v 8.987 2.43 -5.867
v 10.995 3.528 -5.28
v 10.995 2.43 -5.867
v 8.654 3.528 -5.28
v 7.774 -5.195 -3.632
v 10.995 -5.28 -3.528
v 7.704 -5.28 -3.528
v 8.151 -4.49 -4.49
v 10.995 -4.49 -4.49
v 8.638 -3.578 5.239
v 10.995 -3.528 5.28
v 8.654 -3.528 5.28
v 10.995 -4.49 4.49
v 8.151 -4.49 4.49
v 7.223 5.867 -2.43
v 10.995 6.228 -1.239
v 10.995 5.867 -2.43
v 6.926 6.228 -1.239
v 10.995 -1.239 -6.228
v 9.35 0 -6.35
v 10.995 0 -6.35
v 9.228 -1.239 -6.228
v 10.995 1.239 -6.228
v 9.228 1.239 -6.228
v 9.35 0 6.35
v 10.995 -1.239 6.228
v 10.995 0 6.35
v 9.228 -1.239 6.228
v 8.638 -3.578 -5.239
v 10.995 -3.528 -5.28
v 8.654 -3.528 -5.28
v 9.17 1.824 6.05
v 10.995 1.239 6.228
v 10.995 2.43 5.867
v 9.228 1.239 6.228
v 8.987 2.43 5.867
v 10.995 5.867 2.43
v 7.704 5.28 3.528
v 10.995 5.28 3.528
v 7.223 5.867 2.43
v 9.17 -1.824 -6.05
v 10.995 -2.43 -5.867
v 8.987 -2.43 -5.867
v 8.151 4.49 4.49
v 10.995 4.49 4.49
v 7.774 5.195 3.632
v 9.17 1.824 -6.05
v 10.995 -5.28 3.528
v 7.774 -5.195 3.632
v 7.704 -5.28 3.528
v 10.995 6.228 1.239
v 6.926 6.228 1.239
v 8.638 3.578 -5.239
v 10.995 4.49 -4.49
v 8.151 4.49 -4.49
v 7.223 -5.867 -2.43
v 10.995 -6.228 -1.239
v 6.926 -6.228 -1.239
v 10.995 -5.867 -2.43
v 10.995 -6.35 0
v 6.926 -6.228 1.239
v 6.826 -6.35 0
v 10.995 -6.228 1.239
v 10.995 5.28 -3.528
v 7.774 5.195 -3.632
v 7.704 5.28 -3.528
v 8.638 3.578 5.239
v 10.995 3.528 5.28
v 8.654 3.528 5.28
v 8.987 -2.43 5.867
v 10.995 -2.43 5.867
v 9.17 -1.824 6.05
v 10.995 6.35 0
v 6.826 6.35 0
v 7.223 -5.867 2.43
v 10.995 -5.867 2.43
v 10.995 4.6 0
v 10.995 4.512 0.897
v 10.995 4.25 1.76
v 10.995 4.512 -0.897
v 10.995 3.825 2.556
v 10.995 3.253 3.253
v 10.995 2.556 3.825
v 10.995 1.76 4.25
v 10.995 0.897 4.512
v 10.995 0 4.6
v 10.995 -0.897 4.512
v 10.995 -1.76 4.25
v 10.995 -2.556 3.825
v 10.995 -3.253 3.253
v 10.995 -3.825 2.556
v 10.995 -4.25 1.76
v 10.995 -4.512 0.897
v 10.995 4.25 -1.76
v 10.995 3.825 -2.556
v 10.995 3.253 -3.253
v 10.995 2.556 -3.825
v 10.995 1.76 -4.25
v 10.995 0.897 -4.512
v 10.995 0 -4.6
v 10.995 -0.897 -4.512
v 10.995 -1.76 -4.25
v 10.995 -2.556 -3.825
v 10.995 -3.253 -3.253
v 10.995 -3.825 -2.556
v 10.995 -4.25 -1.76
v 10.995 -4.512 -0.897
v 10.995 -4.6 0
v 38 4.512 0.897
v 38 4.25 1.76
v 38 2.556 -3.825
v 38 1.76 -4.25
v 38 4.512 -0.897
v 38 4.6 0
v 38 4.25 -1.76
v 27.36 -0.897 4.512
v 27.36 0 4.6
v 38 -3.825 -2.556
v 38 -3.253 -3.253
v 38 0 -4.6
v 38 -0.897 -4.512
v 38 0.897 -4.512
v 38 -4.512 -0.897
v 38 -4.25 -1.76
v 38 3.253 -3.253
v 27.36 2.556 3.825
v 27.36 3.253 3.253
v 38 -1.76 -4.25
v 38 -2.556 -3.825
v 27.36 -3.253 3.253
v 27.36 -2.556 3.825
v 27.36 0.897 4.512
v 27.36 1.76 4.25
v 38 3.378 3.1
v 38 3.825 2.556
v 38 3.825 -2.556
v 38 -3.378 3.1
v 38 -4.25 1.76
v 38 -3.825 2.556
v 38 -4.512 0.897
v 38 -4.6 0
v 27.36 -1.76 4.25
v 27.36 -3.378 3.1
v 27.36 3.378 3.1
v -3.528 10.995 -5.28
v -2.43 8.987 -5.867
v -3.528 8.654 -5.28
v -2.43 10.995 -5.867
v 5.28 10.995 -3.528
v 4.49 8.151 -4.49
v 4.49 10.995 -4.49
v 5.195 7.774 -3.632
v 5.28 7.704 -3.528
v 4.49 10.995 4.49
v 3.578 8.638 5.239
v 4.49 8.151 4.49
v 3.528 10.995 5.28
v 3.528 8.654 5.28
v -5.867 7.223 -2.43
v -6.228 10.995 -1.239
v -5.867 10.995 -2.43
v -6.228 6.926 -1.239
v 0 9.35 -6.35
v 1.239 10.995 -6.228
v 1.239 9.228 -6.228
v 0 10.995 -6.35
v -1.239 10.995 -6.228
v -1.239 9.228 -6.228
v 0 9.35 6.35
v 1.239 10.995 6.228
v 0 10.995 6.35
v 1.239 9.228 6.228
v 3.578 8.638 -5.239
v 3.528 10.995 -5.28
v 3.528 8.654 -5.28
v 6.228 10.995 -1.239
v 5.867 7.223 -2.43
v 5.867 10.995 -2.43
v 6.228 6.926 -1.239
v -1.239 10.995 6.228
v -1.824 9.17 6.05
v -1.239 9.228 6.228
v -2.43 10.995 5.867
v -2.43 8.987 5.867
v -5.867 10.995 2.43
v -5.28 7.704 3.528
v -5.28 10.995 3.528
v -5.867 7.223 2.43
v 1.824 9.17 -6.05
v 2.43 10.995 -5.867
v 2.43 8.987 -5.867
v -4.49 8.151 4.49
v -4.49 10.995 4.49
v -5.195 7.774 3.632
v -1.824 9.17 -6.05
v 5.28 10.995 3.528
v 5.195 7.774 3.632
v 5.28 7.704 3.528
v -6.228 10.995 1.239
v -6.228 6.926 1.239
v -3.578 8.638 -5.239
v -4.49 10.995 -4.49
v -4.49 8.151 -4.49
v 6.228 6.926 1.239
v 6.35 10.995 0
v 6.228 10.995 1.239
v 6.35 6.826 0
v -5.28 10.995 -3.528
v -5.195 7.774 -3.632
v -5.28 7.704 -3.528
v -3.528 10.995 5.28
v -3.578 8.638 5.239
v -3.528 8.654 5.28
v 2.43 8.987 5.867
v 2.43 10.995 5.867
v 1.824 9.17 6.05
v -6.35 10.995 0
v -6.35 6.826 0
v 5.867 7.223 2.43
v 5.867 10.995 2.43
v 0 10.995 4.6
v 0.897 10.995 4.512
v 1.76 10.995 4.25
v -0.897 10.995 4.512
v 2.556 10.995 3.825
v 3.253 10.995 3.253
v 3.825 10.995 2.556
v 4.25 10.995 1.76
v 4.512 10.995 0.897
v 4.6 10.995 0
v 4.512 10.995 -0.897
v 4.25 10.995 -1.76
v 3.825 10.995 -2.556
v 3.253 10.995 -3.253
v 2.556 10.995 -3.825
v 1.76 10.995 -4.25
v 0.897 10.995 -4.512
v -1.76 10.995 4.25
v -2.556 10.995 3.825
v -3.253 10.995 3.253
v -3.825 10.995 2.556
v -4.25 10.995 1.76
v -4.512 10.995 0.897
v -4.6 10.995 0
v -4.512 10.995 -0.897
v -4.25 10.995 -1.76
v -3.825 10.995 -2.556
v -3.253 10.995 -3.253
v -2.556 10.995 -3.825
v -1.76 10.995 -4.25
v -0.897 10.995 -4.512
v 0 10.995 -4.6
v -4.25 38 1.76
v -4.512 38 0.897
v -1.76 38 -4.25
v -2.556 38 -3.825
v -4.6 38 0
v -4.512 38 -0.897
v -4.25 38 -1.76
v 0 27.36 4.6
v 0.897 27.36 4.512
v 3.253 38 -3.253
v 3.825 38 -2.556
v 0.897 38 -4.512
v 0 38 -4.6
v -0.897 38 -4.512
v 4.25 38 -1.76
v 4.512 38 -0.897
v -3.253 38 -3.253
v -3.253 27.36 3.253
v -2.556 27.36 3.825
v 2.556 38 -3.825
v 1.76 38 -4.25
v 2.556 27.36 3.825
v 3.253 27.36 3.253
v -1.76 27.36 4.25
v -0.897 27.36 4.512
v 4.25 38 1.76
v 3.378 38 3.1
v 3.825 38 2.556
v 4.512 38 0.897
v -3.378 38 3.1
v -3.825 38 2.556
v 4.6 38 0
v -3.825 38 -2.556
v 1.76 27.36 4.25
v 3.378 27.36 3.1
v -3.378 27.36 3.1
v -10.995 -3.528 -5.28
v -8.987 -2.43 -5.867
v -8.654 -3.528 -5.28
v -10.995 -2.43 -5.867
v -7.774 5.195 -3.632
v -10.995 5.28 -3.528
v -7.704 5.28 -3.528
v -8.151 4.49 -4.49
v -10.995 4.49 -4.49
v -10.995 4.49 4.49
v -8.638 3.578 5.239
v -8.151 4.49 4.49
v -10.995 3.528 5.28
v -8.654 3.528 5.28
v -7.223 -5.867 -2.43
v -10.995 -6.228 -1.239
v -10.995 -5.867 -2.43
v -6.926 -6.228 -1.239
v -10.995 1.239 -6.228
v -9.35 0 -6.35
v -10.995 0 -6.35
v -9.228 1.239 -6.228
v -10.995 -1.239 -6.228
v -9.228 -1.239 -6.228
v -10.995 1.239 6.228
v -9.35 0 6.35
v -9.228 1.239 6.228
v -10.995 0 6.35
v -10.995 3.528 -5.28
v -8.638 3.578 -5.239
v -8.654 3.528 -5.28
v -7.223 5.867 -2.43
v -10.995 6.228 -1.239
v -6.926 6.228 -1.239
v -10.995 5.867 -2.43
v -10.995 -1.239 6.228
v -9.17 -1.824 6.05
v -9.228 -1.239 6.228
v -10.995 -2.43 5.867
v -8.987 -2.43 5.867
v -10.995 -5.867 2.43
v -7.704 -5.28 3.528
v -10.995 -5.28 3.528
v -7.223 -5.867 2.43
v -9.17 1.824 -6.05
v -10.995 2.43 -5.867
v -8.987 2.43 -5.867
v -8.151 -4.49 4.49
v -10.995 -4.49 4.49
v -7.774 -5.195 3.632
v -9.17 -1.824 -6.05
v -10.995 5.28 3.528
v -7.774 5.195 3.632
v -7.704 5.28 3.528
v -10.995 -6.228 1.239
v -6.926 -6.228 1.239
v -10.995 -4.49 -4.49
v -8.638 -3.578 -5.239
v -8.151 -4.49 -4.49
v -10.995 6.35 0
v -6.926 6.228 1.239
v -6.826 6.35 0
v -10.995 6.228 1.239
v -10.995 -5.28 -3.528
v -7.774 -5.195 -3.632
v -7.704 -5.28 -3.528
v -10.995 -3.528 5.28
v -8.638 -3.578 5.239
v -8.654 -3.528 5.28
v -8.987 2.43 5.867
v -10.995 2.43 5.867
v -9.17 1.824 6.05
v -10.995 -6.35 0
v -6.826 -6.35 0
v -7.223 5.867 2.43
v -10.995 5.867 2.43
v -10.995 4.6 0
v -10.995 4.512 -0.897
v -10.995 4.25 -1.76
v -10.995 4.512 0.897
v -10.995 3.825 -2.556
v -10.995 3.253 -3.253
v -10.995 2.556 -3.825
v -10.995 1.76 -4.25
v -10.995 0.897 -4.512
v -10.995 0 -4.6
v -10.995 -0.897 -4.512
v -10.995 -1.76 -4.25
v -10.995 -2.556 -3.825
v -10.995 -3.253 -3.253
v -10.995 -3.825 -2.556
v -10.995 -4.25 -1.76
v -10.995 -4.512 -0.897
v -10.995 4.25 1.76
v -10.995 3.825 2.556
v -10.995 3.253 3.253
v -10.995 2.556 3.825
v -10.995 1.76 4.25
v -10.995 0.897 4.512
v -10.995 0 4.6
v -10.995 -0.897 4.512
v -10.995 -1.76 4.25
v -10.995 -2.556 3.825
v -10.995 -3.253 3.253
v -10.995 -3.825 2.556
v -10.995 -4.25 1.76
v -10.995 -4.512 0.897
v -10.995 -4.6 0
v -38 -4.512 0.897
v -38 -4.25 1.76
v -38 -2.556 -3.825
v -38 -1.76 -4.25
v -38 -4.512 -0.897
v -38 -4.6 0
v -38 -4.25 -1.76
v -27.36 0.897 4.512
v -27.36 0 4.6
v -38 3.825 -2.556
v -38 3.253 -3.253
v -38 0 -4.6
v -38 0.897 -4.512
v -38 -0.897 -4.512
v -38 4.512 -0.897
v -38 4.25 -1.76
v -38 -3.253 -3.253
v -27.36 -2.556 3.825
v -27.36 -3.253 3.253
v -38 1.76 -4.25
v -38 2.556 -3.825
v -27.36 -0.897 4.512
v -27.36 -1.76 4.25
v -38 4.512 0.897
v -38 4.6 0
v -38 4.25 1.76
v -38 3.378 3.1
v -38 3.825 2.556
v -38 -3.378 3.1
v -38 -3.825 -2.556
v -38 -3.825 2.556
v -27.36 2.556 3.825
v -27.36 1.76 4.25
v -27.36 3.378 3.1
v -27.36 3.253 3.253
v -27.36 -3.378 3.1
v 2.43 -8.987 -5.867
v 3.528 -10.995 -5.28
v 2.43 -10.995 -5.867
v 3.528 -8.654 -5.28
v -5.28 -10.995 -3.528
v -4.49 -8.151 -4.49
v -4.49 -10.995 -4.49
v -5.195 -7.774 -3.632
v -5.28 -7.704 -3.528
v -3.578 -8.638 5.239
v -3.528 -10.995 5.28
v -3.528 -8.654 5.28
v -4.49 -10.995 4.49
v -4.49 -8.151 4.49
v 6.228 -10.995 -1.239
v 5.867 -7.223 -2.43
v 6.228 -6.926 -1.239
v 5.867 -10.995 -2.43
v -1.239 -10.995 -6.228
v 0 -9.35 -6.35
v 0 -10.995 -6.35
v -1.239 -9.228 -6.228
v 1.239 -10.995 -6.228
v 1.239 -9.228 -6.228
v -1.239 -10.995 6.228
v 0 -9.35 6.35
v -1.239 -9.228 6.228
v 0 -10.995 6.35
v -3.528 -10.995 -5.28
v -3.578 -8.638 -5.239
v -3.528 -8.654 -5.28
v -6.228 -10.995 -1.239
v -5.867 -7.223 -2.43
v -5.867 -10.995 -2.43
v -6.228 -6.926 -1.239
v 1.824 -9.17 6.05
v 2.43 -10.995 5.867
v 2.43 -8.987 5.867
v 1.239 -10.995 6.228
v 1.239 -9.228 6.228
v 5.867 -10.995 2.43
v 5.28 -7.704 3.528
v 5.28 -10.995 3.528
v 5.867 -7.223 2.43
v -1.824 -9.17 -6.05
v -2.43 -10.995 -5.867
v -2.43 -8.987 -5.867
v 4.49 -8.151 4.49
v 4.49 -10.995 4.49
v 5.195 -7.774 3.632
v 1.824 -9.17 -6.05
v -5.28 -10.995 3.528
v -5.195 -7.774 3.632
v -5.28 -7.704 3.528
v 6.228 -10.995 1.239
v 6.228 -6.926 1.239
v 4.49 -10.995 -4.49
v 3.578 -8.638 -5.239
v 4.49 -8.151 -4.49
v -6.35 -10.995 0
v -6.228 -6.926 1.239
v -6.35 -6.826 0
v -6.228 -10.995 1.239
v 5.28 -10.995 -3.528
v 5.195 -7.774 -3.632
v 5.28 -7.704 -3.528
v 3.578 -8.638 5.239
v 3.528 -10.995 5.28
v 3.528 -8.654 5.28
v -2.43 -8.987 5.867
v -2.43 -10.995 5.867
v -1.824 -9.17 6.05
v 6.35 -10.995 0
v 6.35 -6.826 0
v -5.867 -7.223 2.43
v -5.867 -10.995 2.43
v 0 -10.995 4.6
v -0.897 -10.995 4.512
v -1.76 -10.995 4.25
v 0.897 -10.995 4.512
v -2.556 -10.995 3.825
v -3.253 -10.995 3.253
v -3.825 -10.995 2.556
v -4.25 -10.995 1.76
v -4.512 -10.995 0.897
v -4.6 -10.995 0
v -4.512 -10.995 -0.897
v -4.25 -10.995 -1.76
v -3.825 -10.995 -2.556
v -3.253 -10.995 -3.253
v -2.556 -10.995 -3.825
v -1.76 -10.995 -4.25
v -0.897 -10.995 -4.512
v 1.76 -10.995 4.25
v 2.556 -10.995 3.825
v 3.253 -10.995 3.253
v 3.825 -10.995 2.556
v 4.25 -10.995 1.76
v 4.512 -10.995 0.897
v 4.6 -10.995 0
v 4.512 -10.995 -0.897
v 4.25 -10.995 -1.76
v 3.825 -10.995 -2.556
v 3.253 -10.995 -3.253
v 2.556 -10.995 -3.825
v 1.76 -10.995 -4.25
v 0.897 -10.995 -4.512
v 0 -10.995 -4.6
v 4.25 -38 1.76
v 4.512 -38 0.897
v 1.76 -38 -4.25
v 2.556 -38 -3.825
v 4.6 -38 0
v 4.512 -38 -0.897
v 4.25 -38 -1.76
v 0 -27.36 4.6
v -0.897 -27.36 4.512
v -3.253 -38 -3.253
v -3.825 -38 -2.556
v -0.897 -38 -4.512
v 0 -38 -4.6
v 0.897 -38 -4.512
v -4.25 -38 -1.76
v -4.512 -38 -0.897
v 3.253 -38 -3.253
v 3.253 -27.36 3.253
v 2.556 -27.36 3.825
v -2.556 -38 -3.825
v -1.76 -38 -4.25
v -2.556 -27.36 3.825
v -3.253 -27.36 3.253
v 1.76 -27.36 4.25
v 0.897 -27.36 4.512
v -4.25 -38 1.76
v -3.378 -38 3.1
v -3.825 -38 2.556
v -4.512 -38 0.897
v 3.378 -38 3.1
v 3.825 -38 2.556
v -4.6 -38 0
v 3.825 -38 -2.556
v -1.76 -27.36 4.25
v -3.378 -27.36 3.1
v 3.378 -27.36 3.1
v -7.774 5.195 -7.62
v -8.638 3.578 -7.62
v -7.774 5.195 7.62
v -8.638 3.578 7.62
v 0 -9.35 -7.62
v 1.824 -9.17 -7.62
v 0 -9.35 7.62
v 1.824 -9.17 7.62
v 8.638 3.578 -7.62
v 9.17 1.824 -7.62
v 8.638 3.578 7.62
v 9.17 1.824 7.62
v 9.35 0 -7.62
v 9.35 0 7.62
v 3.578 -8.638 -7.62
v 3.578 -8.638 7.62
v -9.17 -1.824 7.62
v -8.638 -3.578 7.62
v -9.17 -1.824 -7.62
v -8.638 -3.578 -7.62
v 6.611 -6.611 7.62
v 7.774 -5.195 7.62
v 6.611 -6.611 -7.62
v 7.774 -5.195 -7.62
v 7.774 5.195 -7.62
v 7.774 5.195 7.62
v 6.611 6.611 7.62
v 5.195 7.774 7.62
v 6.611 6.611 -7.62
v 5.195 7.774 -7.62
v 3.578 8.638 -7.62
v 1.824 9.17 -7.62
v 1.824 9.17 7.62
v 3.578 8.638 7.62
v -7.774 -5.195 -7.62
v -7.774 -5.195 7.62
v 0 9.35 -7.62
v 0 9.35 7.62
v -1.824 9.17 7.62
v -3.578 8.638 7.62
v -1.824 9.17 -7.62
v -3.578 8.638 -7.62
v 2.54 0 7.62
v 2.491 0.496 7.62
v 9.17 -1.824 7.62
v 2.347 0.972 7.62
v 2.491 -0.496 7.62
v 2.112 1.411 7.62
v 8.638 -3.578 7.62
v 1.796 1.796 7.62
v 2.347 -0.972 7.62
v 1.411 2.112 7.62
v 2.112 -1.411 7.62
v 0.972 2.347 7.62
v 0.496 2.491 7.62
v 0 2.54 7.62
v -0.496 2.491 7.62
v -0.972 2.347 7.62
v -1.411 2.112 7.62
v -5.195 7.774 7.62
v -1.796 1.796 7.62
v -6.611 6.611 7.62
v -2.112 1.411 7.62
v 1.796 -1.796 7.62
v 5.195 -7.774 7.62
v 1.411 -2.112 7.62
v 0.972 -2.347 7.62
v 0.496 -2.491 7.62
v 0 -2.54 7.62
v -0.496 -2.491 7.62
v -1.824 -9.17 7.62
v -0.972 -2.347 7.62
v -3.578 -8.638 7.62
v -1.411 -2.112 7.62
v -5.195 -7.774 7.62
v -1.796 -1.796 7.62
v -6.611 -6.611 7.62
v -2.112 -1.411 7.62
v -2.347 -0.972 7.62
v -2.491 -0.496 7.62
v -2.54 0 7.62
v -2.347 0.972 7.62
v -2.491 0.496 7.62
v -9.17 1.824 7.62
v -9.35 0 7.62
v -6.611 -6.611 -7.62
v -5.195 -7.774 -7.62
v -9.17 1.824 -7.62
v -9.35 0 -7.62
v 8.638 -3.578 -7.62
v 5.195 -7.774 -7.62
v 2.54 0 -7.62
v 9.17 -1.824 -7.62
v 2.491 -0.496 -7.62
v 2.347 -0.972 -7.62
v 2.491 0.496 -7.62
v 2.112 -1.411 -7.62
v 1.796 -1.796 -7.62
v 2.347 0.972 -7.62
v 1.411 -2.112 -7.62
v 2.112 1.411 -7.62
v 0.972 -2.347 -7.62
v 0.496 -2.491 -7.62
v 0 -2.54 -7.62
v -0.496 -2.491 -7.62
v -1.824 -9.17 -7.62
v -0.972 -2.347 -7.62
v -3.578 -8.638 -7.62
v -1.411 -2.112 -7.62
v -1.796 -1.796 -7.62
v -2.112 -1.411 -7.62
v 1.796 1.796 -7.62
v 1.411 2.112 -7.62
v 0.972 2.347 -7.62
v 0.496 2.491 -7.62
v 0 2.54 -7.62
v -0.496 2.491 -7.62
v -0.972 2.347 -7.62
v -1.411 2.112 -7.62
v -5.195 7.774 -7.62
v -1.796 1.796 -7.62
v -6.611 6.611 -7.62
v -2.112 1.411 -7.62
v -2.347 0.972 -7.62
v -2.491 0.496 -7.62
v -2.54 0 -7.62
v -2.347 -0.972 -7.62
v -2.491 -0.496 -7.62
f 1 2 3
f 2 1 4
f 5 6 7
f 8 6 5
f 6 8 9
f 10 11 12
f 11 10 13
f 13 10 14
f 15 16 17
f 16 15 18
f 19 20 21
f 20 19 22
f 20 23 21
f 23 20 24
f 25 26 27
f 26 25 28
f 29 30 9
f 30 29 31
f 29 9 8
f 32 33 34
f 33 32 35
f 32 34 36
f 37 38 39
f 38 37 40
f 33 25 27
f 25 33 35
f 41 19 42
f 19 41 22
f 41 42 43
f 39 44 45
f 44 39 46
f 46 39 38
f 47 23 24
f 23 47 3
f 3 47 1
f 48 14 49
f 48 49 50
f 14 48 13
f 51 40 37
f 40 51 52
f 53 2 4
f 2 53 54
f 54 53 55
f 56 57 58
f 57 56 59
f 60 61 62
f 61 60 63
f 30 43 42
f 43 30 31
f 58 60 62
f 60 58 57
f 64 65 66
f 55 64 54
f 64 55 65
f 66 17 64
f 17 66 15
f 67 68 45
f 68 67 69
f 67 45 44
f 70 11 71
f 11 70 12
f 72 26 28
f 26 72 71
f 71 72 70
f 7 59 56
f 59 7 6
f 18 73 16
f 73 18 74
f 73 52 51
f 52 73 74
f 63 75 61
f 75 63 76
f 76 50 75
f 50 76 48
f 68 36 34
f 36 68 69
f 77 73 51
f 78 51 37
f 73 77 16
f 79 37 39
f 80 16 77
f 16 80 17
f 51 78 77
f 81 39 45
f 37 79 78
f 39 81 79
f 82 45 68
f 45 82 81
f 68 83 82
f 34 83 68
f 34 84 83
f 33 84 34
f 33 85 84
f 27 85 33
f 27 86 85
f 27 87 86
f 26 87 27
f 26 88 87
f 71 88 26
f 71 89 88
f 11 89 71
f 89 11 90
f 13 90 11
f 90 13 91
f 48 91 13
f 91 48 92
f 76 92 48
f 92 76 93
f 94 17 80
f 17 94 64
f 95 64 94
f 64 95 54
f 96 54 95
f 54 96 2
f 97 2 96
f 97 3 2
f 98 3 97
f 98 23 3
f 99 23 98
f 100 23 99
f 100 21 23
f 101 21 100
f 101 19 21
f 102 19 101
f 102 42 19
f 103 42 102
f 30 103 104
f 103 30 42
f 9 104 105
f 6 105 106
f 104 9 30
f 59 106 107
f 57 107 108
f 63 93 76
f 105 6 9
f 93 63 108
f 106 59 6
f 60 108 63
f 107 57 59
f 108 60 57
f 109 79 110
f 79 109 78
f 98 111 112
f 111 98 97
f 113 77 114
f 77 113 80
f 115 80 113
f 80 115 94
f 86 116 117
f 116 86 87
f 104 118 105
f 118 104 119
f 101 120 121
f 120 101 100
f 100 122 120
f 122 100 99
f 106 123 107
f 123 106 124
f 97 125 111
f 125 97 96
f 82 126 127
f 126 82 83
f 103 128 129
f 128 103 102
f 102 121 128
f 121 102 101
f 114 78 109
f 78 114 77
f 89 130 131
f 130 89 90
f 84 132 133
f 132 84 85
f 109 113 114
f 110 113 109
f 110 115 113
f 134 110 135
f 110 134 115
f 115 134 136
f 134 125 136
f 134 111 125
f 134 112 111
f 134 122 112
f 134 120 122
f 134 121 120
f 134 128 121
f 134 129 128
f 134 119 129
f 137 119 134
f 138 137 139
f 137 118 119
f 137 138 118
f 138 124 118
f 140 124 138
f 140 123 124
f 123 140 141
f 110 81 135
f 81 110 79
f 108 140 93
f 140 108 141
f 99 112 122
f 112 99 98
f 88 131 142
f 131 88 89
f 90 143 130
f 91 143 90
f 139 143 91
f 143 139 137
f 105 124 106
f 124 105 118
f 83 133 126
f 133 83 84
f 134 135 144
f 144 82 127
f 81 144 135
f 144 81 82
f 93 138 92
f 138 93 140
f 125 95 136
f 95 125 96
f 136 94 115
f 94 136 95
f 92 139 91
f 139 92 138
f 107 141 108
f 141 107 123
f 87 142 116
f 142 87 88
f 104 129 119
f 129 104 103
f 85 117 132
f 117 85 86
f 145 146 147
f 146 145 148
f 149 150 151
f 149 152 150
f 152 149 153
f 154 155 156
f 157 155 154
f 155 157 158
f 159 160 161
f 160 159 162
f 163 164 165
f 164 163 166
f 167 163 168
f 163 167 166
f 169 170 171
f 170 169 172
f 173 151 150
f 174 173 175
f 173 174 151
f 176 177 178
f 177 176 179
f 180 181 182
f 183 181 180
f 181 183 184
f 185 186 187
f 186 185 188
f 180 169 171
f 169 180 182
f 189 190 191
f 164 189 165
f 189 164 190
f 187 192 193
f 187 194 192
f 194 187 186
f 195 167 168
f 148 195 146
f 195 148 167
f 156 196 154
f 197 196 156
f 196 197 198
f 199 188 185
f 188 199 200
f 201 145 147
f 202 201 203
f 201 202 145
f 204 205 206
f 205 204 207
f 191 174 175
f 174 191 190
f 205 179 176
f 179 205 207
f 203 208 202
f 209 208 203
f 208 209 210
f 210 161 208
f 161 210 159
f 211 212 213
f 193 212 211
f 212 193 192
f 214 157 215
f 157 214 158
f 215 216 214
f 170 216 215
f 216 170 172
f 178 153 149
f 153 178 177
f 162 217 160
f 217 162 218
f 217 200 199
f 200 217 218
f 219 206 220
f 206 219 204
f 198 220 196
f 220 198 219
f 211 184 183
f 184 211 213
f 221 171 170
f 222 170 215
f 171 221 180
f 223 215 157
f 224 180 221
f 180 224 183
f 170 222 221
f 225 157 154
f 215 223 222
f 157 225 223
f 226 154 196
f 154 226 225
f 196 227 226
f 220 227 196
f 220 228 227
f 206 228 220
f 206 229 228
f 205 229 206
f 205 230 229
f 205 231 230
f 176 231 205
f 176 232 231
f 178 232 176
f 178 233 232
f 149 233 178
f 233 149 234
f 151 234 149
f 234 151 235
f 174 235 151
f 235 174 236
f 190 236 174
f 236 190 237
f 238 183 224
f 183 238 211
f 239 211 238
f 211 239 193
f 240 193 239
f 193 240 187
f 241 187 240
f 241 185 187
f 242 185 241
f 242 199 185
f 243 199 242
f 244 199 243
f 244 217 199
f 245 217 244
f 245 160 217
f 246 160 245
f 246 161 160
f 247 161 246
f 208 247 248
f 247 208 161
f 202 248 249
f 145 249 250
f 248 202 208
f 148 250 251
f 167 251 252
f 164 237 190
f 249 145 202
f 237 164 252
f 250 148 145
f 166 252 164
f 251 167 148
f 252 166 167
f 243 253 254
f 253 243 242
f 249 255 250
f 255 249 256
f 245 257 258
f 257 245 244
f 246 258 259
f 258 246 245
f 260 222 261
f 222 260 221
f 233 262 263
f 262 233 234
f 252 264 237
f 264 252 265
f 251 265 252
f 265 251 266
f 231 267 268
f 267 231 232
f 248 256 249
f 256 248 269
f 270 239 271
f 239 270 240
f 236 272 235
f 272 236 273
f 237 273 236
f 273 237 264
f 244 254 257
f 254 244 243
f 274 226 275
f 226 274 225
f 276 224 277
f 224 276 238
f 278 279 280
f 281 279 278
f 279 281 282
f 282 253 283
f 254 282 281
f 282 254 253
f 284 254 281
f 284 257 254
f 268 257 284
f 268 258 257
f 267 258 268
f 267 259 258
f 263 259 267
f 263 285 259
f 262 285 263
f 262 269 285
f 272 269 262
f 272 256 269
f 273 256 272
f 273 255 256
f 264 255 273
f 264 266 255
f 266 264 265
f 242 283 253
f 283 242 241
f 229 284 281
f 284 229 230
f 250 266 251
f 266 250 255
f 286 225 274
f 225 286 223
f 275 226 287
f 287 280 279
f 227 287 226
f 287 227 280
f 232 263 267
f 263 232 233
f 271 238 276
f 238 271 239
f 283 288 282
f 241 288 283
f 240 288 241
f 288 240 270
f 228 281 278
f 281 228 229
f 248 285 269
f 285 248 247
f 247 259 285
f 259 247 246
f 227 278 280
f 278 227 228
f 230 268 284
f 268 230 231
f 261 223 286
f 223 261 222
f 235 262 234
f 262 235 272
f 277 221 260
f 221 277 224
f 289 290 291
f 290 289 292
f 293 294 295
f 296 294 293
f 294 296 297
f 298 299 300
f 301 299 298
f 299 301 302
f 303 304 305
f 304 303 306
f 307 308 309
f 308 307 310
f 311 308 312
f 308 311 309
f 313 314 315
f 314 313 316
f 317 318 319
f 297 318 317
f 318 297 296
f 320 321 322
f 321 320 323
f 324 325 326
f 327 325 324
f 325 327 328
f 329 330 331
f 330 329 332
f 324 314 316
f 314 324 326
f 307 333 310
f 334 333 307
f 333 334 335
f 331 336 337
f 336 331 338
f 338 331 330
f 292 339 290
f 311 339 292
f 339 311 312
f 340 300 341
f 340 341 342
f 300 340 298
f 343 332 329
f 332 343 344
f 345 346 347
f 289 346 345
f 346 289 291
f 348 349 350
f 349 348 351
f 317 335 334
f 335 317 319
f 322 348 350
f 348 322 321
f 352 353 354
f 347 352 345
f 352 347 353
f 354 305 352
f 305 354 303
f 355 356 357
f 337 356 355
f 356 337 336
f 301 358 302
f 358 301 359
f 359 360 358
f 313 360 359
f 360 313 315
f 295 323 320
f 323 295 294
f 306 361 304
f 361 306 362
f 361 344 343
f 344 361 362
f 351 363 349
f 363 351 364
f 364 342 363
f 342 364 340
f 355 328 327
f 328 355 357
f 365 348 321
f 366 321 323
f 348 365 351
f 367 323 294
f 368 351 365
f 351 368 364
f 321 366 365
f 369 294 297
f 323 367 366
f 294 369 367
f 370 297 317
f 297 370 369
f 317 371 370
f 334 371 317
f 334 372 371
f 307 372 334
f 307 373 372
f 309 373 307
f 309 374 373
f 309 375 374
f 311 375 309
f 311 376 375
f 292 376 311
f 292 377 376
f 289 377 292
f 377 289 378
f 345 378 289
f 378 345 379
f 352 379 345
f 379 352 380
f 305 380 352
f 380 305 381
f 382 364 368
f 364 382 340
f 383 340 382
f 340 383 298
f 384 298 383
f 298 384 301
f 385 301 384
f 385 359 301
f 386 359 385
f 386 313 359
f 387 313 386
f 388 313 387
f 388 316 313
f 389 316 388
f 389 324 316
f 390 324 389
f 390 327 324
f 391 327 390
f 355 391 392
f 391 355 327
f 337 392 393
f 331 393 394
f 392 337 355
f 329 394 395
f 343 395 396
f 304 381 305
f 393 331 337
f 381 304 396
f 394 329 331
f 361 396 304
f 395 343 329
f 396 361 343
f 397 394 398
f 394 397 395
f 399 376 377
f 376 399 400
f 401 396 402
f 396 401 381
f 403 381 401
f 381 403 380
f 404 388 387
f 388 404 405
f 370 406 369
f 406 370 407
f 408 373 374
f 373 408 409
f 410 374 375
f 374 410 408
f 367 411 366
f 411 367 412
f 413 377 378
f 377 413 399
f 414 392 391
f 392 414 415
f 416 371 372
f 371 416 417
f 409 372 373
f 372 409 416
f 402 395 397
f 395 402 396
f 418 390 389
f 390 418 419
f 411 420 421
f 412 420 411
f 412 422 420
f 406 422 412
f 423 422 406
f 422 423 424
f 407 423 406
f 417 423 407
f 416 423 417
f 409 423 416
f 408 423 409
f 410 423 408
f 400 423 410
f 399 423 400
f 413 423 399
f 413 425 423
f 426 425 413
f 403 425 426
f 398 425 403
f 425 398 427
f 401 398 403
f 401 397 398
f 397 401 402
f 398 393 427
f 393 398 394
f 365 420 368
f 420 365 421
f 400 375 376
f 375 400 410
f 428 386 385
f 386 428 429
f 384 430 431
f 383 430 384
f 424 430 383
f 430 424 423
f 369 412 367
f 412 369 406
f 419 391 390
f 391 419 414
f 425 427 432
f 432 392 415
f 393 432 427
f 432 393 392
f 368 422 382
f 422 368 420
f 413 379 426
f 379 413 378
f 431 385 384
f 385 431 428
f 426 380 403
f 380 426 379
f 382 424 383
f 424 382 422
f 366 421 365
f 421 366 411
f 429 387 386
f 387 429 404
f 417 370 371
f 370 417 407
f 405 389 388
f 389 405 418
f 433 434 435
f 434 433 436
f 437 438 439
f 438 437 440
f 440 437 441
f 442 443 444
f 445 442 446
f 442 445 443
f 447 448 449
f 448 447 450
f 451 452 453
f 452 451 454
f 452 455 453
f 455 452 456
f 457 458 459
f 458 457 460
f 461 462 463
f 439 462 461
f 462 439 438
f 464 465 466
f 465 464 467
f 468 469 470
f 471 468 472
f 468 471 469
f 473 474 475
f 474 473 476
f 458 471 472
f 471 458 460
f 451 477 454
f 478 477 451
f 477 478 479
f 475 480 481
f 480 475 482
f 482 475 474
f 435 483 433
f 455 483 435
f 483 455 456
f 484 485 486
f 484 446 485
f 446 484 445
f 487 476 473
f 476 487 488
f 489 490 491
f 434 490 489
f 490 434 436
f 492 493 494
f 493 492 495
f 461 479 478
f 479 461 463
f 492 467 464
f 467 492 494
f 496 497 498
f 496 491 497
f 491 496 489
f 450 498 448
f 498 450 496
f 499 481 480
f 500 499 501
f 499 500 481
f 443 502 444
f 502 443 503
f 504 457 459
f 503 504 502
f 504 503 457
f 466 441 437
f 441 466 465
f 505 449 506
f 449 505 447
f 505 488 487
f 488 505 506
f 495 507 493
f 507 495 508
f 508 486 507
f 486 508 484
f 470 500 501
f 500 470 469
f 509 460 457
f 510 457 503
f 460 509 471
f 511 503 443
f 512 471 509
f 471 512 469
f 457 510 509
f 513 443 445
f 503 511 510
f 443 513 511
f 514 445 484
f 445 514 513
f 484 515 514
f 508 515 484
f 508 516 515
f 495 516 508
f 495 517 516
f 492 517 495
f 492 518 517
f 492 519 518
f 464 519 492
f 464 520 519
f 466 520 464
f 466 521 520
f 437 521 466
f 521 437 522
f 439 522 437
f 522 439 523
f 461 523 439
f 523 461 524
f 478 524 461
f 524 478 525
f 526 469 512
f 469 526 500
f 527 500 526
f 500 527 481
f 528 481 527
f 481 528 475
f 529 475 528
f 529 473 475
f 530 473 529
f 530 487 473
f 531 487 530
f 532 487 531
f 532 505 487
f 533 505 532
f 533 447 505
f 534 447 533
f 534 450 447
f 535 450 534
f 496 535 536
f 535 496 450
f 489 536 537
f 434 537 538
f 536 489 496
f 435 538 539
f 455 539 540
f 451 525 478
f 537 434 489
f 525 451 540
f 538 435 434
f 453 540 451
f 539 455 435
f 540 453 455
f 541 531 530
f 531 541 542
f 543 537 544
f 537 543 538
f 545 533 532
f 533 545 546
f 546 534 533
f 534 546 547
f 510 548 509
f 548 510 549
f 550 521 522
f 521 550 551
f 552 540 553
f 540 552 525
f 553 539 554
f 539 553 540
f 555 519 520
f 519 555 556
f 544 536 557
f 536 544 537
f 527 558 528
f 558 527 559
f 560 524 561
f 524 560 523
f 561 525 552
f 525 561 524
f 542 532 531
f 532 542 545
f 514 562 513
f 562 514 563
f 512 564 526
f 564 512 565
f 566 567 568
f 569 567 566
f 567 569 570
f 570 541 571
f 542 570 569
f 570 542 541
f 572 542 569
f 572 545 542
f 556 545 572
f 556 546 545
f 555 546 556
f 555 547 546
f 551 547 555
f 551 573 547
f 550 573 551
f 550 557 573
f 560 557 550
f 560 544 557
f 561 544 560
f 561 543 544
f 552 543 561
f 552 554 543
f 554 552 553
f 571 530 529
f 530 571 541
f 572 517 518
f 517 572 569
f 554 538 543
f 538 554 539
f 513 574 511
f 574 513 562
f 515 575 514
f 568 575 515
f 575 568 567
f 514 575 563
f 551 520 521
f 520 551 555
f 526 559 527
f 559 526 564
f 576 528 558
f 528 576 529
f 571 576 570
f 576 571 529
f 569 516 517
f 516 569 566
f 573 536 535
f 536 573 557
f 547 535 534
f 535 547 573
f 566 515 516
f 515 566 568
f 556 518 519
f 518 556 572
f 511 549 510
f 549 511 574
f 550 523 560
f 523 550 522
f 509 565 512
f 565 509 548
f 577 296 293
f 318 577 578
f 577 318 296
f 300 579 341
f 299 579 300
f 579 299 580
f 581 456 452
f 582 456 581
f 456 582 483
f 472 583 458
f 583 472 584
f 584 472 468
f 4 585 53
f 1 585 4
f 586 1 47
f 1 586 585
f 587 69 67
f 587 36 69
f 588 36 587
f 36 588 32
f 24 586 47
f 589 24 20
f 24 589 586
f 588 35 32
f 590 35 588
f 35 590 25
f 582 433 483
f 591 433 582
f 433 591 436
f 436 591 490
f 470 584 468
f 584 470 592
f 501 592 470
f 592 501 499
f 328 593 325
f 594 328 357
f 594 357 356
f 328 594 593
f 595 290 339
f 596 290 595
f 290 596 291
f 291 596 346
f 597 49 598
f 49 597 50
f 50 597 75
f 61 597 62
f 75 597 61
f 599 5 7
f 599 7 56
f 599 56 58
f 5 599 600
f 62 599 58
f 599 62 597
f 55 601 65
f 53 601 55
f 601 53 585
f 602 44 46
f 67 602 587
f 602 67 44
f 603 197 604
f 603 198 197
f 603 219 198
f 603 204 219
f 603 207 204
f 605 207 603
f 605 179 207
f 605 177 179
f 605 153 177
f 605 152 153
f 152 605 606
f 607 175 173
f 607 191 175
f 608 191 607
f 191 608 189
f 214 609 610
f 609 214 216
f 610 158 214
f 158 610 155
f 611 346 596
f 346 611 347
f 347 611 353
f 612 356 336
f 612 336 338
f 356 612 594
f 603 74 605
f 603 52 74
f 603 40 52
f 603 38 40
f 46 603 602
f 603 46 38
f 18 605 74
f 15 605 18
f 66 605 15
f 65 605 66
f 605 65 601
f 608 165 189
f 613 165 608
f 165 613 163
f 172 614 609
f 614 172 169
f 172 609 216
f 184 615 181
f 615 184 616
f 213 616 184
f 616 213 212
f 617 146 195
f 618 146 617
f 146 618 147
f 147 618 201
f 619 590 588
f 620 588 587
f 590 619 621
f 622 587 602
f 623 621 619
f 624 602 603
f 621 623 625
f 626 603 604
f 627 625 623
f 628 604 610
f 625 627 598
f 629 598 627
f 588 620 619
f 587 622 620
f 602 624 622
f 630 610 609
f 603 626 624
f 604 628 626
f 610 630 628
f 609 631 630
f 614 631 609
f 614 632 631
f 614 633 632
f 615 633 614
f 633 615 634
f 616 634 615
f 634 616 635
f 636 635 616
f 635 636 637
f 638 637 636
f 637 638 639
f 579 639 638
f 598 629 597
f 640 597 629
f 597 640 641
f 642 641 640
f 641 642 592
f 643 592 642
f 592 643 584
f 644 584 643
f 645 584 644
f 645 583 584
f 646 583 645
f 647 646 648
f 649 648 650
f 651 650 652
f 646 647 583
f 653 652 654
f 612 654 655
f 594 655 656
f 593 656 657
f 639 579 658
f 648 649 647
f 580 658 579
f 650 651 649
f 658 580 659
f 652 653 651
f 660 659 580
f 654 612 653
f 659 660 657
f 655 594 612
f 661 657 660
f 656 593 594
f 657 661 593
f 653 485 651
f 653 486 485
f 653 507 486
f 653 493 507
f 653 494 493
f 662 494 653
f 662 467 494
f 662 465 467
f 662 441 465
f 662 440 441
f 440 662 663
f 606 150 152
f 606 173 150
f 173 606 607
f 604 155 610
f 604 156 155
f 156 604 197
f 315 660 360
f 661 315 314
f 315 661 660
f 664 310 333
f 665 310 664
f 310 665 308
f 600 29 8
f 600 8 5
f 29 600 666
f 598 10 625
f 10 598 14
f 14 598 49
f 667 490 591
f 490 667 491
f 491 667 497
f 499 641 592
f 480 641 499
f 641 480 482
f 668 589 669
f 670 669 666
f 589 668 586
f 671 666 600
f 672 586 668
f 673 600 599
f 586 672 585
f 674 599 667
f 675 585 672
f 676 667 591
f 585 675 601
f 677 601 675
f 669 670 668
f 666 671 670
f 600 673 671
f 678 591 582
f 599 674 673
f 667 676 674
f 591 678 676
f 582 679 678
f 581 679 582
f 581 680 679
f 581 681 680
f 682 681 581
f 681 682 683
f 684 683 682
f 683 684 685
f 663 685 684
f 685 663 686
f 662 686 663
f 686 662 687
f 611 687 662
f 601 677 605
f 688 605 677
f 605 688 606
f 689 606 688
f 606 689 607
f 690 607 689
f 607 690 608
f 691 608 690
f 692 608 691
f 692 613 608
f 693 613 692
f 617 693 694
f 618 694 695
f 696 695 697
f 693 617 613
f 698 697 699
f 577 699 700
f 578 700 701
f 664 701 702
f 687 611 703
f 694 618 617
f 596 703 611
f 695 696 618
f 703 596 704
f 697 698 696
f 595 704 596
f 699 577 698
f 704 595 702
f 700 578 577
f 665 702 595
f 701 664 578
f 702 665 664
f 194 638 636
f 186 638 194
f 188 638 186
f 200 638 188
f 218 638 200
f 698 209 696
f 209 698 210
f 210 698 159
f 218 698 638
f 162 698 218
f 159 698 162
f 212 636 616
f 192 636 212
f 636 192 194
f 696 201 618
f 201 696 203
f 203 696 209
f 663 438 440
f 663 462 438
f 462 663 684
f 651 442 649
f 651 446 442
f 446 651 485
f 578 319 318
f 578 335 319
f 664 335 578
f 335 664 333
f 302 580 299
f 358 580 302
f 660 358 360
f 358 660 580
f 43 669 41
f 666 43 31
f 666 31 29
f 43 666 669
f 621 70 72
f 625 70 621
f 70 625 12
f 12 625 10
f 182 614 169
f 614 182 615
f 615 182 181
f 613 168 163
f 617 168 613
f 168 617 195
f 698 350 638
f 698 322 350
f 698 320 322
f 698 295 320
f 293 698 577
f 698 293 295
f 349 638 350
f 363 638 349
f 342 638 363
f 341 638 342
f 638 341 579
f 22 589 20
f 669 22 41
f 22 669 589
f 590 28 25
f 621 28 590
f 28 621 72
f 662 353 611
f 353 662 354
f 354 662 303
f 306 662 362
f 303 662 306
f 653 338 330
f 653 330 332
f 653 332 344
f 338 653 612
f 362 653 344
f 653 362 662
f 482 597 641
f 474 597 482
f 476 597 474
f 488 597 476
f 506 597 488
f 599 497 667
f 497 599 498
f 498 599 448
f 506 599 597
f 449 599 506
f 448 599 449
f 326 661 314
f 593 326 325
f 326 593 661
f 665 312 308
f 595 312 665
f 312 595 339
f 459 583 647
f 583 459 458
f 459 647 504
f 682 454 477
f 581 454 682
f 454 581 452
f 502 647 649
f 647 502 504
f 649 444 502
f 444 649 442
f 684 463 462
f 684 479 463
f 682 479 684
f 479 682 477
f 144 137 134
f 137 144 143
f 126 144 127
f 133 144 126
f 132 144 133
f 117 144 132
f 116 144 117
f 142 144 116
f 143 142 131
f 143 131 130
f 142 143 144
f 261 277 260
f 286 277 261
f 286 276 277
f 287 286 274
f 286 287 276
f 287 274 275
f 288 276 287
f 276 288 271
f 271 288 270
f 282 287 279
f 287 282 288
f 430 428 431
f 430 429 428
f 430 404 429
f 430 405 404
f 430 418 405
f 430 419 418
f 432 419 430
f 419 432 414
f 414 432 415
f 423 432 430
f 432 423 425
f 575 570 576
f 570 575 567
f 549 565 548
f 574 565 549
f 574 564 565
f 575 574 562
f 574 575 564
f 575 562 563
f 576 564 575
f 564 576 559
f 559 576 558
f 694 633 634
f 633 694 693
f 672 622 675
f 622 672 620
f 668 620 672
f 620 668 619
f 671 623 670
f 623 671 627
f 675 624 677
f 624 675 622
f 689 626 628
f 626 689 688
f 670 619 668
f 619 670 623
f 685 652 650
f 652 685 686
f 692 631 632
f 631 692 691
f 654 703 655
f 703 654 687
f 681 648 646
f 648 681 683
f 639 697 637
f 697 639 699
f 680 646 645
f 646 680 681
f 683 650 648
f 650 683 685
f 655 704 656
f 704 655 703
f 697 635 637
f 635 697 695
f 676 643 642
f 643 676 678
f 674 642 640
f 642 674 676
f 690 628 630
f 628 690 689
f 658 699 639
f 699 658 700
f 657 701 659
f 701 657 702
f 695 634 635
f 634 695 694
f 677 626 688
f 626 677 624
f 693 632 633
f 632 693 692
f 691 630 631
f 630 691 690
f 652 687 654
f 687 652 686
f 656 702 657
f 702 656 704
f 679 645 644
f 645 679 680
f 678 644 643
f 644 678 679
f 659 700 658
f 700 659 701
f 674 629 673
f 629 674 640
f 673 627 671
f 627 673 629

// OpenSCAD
$fn = 32;

// ----------------------------------------------------------------------
// Cardan cross: 76 mm span, 12.7 mm trunnions
// ----------------------------------------------------------------------

// --- parameters (mm) ---
journal_d = 12.7;         // trunnion diameter
arm_len = 38;             // trunnion length from the centre
step_r = 4.32;            // step position from the centre
step_d = 9.2;             // journal diameter after the step
hub_d = 18.7;             // hub diameter
hub_h = 15.24;            // hub height
bore_d = 5.08;            // hub bore
flat_d = 1.5;             // depth of the journal flat
flat_len = 10.64;         // length of the journal flat

difference() {
  union() {
    /* hub along the joint axis */
    cylinder(h = hub_h, d = hub_d, center = true);
    for (a = [0 : 90 : 270]) rotate([0, 0, a]) {
      /* trunnion, sunk into the hub */
      translate([hub_d / 4, 0, 0]) rotate([0, 90, 0]) cylinder(h = step_r + 2, d = journal_d);
      /* stepped journal out to the tip */
      translate([step_r - 0.5, 0, 0]) rotate([0, 90, 0]) cylinder(h = arm_len + 0.5 - step_r, d = step_d);
    }
  }
  /* lubrication bore through the hub, 2.5 mm clear on both sides */
  translate([0, 0, -hub_h / 2 - 2.5]) cylinder(h = hub_h + 5, d = bore_d);
  /* machined flat on each journal tip */
  for (a = [0 : 90 : 270]) rotate([0, 0, a]) {
    translate([arm_len - flat_len, -step_d, step_d / 2 - flat_d]) cube([flat_len + 0.5, 2 * step_d, flat_d + 2.5]);
  }
}
